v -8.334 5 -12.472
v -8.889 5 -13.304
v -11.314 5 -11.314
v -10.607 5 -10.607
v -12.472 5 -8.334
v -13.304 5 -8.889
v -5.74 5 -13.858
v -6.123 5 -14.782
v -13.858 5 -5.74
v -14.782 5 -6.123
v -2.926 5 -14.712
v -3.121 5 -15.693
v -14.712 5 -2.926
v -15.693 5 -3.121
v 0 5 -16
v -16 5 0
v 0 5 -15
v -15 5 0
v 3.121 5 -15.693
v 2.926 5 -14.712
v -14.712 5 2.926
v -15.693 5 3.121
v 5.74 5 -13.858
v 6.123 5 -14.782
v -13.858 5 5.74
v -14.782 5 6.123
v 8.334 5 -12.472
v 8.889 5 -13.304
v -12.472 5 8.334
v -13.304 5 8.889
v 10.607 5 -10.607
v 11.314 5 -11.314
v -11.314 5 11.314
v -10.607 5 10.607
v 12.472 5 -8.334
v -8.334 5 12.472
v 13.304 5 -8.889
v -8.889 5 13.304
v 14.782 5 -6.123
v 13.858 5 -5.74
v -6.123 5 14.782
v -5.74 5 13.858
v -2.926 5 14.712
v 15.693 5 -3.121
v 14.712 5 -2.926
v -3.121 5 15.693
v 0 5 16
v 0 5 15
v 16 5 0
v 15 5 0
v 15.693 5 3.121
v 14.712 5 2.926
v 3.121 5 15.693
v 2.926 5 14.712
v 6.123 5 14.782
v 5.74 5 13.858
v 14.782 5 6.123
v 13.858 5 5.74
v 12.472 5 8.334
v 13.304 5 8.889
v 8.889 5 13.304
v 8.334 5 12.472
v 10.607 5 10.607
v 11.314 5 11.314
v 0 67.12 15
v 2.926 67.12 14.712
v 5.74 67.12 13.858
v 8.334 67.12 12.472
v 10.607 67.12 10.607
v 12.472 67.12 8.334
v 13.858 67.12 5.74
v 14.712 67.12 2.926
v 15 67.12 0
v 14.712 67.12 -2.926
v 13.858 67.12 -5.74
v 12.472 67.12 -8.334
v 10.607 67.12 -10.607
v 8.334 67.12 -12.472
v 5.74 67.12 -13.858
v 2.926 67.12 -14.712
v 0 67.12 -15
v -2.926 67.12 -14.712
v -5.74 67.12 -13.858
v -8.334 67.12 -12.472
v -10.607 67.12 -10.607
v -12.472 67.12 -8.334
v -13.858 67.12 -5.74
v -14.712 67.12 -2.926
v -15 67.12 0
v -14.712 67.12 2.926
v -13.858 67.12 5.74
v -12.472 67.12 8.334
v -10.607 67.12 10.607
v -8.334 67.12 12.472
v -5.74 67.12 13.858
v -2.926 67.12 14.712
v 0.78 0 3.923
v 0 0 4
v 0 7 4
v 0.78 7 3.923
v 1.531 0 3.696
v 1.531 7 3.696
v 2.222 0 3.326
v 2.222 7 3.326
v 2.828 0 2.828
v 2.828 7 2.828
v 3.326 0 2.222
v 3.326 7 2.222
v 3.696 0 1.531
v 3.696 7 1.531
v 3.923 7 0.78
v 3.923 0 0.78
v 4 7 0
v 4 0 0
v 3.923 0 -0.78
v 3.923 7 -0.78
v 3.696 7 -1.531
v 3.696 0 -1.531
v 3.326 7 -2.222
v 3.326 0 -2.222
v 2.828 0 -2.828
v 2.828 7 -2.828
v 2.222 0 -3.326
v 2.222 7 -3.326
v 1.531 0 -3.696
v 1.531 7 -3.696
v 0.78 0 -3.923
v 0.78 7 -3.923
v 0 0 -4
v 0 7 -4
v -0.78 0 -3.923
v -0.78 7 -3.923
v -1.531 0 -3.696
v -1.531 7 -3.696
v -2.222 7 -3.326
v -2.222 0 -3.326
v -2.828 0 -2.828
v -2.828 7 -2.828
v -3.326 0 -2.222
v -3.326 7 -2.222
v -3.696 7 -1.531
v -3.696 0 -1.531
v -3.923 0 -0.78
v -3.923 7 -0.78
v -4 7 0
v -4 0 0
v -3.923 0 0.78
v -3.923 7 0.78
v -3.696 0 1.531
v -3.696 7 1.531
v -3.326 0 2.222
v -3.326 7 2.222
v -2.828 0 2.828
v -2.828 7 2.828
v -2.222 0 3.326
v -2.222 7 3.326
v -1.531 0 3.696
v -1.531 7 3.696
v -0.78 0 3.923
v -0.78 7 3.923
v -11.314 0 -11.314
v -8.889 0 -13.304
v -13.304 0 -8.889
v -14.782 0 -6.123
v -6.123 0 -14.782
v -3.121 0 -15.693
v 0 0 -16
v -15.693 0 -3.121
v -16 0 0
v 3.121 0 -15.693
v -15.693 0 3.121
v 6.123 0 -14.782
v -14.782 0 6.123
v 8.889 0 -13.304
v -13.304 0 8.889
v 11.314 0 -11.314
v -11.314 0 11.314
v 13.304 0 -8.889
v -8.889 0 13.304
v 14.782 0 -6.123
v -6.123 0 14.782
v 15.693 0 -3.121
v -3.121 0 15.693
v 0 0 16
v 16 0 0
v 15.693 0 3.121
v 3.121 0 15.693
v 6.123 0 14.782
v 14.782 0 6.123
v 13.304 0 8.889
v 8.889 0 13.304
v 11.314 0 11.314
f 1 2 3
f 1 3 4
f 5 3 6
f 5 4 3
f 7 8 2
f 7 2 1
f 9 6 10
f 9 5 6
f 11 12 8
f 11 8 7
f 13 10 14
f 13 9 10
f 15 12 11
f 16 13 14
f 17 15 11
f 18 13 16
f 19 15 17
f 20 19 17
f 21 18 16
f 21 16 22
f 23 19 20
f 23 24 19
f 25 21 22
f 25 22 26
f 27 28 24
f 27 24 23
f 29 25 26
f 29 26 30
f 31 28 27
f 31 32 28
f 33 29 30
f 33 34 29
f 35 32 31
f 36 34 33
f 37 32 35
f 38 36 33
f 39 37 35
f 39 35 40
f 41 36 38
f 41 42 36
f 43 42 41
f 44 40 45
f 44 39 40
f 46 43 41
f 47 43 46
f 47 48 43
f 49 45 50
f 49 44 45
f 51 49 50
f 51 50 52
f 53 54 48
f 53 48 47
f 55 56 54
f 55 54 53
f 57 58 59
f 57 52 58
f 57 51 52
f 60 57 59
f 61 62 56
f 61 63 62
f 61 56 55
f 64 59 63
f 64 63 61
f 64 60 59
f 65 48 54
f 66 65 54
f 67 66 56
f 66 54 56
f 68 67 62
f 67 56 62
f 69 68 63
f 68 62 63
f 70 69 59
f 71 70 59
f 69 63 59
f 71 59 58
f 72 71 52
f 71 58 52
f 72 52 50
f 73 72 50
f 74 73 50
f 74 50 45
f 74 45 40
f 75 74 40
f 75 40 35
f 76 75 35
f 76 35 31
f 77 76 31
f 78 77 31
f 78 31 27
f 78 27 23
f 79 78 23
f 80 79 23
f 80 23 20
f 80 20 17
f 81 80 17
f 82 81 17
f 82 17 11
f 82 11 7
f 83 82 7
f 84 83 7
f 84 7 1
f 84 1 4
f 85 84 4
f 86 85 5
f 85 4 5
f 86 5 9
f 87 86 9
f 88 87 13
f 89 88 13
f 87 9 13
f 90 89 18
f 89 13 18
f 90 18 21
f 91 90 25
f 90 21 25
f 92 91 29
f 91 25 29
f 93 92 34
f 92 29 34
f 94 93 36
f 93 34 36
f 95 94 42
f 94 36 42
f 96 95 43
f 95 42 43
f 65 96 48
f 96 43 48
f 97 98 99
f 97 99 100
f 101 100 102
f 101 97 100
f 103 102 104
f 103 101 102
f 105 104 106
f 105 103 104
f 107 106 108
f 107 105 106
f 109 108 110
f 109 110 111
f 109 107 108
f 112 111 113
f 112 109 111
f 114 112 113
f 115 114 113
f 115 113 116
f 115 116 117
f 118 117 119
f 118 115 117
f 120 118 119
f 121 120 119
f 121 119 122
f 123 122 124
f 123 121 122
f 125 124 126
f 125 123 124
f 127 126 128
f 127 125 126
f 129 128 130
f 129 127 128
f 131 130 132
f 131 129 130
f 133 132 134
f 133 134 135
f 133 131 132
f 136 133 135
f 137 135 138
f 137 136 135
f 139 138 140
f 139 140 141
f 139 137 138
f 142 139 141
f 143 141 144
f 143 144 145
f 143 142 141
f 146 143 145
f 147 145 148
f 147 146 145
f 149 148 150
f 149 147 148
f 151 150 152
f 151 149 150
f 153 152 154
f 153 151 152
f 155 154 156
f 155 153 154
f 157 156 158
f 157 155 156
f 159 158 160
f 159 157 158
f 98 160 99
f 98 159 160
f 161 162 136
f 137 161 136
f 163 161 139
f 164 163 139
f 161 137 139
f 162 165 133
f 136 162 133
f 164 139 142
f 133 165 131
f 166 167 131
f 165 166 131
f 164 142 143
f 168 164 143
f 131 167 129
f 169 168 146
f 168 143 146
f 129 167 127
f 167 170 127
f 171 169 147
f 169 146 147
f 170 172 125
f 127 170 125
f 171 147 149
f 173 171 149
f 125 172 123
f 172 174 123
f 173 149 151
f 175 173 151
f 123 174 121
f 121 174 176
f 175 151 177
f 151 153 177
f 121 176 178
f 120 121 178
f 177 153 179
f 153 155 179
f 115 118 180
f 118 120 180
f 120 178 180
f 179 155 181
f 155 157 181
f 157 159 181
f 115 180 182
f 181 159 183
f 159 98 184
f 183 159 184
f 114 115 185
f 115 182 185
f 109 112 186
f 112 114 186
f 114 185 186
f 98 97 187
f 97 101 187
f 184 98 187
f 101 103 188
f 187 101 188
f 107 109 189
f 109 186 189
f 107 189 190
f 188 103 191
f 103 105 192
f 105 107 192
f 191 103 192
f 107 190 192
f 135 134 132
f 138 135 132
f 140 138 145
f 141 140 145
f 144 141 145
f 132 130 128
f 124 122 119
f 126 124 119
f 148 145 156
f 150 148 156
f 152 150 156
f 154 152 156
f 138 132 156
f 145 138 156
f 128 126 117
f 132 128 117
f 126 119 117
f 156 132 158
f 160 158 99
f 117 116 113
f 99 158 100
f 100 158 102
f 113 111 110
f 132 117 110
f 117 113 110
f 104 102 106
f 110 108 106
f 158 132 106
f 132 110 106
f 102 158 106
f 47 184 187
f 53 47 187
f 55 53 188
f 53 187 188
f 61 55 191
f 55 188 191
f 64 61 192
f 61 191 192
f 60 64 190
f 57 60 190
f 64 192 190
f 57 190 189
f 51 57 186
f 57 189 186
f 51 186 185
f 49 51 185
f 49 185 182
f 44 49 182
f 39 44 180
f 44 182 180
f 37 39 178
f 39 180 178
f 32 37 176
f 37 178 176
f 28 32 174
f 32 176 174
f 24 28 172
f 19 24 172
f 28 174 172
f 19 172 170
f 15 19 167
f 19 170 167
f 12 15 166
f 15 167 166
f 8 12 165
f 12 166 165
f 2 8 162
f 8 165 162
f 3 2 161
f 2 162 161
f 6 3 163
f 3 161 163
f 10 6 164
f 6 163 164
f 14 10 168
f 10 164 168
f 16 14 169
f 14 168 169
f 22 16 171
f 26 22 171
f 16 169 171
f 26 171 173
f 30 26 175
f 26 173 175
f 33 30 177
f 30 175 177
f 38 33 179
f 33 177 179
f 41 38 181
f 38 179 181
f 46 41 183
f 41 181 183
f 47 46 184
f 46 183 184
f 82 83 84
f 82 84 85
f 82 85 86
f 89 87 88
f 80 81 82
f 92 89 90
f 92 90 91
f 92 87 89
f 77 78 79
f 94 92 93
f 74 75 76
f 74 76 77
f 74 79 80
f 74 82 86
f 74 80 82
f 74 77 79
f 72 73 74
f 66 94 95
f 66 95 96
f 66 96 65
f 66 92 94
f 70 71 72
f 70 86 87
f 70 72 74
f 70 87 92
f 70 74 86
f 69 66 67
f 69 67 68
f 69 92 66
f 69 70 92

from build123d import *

# Parameters (mm, degrees)
SKETCH1_R           = 15
BOSS_EXTRUDE1_DEPTH = 67.12
SKETCH1_3_R         = 4
CUT_EXTRUDE1_DEPTH  = 7
SKETCH1_4_R         = 16
SKETCH1_4_R_2       = 15
BOSS_EXTRUDE2_DEPTH = 5


with BuildPart() as part:
    # Sketch1 → Boss-Extrude1 (new body)
    with BuildSketch(Plane(origin=(0, 0, 0), x_dir=(1, 0, 0), z_dir=(0, 1, 0))):
        Circle(SKETCH1_R)
    extrude(amount=BOSS_EXTRUDE1_DEPTH)

    # Sketch1<3> → Cut-Extrude1 (cut)
    with BuildSketch(Plane(origin=(0, 0, 0), x_dir=(1, 0, 0), z_dir=(0, 1, 0))):
        Circle(SKETCH1_3_R)
    extrude(amount=CUT_EXTRUDE1_DEPTH, mode=Mode.SUBTRACT)

    # Sketch1<4> → Boss-Extrude2 (add)
    with BuildSketch(Plane(origin=(0, 0, 0), x_dir=(1, 0, 0), z_dir=(0, 1, 0))):
        Circle(SKETCH1_4_R)
        Circle(SKETCH1_4_R_2, mode=Mode.SUBTRACT)
    extrude(amount=BOSS_EXTRUDE2_DEPTH)


solid = part.part
